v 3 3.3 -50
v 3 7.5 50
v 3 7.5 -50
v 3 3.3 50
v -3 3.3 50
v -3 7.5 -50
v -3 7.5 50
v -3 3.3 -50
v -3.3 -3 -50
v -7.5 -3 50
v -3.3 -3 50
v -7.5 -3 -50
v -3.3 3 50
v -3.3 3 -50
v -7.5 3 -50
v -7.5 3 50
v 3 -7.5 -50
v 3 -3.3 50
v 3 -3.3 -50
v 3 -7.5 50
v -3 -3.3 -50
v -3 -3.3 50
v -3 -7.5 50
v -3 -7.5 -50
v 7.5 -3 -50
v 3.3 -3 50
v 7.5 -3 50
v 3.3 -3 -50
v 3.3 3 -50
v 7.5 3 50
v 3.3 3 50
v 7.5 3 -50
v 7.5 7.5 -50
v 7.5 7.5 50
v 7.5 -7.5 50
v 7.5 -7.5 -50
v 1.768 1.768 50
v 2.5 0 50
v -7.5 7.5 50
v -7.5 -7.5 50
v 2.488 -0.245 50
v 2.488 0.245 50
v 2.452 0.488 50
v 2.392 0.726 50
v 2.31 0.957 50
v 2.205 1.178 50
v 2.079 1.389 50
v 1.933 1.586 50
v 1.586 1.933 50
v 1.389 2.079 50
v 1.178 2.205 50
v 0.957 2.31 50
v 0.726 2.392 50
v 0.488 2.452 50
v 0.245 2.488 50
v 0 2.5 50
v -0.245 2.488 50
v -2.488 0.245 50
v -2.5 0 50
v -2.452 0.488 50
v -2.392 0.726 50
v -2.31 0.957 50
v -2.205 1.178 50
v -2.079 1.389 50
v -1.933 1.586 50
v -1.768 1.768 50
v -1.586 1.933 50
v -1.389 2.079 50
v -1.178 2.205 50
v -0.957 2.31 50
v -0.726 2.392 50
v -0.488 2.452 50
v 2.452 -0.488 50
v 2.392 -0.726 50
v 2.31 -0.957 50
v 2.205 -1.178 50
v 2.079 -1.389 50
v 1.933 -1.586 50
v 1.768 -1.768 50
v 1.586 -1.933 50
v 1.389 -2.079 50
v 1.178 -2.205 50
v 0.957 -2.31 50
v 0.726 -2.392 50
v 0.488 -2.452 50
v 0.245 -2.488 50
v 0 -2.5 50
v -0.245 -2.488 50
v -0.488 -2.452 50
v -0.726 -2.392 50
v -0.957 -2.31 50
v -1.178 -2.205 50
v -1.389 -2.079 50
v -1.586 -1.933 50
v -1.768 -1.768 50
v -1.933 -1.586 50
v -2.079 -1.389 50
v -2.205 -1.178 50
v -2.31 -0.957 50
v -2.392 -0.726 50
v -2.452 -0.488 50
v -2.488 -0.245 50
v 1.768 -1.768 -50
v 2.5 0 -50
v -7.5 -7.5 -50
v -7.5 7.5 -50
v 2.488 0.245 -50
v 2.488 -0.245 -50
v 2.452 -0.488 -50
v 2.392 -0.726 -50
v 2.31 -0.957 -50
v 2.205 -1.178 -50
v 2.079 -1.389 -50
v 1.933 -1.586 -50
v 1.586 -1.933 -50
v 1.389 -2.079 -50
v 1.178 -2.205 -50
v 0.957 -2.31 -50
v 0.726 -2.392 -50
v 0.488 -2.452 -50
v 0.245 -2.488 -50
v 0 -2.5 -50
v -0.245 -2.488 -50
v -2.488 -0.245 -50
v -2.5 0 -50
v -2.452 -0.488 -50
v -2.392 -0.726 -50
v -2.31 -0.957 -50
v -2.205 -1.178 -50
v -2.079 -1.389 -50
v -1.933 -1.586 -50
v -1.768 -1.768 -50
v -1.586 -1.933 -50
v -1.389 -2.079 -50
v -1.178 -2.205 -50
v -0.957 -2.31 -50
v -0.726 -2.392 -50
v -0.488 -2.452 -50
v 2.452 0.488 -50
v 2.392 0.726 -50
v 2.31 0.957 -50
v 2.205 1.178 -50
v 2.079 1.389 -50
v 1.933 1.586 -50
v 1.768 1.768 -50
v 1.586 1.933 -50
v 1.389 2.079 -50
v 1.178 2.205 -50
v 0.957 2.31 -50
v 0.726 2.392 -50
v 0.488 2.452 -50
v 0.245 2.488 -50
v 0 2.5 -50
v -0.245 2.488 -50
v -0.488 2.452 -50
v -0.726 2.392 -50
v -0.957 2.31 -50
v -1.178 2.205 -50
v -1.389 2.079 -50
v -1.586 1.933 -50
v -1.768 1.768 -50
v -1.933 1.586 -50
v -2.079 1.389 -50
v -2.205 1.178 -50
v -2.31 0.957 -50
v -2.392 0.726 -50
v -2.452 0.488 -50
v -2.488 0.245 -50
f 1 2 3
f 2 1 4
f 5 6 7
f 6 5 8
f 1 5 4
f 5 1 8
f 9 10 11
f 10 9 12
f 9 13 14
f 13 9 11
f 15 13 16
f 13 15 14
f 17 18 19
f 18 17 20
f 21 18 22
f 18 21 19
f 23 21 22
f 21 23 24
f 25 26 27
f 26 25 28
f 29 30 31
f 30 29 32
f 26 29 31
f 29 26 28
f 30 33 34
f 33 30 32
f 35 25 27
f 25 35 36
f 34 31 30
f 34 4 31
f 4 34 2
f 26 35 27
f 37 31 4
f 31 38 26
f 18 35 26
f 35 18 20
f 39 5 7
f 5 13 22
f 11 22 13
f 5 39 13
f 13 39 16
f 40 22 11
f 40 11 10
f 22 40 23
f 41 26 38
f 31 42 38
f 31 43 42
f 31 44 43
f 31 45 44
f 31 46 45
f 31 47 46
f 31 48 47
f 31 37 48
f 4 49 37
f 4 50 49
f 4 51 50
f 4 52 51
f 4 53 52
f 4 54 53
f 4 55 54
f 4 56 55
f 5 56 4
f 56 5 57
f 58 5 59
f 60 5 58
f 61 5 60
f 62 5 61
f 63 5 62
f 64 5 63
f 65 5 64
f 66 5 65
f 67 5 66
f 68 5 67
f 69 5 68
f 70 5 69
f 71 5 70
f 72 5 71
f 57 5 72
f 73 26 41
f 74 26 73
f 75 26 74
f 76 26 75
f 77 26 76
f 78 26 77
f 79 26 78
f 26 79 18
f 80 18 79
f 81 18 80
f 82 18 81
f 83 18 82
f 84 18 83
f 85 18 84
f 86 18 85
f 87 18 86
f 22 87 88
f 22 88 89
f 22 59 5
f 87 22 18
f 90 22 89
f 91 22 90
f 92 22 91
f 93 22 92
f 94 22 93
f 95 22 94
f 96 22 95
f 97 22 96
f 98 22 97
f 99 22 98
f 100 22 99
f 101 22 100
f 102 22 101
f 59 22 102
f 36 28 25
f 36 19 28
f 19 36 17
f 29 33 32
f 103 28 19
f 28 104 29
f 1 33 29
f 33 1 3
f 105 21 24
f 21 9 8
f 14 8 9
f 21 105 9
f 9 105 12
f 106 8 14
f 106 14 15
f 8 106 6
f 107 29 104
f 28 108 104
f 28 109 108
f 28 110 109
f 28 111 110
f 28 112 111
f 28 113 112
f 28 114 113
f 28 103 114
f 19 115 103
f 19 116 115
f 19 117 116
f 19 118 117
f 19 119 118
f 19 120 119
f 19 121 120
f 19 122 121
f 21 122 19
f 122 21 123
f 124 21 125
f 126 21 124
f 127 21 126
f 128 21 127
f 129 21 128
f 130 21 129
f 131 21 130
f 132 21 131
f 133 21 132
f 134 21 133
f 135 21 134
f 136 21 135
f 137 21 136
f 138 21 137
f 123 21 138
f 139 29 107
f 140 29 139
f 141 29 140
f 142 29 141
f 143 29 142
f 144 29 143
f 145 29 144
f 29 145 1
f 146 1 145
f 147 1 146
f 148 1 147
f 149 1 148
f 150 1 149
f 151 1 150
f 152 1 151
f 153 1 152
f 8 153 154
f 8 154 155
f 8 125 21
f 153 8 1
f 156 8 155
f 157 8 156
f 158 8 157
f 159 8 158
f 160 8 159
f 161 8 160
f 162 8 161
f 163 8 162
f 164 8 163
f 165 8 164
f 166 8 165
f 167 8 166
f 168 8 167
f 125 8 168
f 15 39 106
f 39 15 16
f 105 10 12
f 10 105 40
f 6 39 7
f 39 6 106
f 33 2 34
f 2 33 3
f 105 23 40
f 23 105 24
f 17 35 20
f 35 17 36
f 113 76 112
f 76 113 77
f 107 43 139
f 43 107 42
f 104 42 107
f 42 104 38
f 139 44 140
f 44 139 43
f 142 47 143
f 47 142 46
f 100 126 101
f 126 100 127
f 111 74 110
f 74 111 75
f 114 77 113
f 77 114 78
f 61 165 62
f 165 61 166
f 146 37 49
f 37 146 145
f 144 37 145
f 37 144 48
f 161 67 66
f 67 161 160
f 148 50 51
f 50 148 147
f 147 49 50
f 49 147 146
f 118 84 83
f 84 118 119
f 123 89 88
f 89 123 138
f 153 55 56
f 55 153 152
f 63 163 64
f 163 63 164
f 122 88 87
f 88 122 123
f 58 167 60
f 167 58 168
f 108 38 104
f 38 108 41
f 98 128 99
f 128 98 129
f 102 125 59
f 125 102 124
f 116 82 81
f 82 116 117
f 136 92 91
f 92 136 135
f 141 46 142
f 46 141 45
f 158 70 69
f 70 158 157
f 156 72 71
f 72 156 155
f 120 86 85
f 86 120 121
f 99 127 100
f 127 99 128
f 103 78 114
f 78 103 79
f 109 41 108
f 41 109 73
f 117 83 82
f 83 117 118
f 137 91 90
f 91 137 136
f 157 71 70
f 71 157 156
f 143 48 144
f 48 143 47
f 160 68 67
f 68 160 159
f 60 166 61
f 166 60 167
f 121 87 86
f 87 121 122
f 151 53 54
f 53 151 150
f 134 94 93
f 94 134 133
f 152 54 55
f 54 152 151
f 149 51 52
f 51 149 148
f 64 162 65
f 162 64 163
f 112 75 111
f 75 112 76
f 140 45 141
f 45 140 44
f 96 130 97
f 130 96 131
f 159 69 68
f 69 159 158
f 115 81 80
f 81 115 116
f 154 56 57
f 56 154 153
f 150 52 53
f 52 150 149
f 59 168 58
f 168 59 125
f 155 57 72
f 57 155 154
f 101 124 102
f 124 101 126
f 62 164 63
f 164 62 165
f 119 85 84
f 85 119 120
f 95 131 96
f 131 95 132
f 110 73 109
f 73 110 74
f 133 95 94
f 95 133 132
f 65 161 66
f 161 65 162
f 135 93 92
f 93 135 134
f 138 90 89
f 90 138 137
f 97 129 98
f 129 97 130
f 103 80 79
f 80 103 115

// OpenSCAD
$fn = 64;

module t_slot_1515(length=100, size=15) {
    // Typical 15x15 T-slot style (approximate), extruded along Z
    wall = 1.5;          // outer wall thickness
    slot_w = 6.0;        // slot opening width at the face
    slot_d = 4.2;        // slot depth from face inward
    throat_w = 3.2;      // narrower throat near the center
    web = 1.2;           // material between throat and center bore
    bore_r = 2.5;        // center bore radius

    eps = 0.02;

    difference() {
        // Outer body
        cube([size, size, length], center=true);

        // Four T-slots (one per face), cut as a union of two rectangles:
        // - outer opening (wider)
        // - inner throat (narrower), reaching close to the center
        for (a = [0:90:270]) {
            rotate([0, 0, a]) {
                // Outer opening
                translate([0, size/2 - slot_d/2 + eps, 0])
                    cube([slot_w, slot_d + 2*eps, length + 2], center=true);

                // Inner throat
                throat_len = size/2 - slot_d - (bore_r + web);
                translate([0, (bore_r + web) + throat_len/2, 0])
                    cube([throat_w, throat_len + 2*eps, length + 2], center=true);
            }
        }

        // Center bore
        cylinder(r=bore_r, h=length + 2, center=true);
    }
}

t_slot_1515(length=100, size=15);
